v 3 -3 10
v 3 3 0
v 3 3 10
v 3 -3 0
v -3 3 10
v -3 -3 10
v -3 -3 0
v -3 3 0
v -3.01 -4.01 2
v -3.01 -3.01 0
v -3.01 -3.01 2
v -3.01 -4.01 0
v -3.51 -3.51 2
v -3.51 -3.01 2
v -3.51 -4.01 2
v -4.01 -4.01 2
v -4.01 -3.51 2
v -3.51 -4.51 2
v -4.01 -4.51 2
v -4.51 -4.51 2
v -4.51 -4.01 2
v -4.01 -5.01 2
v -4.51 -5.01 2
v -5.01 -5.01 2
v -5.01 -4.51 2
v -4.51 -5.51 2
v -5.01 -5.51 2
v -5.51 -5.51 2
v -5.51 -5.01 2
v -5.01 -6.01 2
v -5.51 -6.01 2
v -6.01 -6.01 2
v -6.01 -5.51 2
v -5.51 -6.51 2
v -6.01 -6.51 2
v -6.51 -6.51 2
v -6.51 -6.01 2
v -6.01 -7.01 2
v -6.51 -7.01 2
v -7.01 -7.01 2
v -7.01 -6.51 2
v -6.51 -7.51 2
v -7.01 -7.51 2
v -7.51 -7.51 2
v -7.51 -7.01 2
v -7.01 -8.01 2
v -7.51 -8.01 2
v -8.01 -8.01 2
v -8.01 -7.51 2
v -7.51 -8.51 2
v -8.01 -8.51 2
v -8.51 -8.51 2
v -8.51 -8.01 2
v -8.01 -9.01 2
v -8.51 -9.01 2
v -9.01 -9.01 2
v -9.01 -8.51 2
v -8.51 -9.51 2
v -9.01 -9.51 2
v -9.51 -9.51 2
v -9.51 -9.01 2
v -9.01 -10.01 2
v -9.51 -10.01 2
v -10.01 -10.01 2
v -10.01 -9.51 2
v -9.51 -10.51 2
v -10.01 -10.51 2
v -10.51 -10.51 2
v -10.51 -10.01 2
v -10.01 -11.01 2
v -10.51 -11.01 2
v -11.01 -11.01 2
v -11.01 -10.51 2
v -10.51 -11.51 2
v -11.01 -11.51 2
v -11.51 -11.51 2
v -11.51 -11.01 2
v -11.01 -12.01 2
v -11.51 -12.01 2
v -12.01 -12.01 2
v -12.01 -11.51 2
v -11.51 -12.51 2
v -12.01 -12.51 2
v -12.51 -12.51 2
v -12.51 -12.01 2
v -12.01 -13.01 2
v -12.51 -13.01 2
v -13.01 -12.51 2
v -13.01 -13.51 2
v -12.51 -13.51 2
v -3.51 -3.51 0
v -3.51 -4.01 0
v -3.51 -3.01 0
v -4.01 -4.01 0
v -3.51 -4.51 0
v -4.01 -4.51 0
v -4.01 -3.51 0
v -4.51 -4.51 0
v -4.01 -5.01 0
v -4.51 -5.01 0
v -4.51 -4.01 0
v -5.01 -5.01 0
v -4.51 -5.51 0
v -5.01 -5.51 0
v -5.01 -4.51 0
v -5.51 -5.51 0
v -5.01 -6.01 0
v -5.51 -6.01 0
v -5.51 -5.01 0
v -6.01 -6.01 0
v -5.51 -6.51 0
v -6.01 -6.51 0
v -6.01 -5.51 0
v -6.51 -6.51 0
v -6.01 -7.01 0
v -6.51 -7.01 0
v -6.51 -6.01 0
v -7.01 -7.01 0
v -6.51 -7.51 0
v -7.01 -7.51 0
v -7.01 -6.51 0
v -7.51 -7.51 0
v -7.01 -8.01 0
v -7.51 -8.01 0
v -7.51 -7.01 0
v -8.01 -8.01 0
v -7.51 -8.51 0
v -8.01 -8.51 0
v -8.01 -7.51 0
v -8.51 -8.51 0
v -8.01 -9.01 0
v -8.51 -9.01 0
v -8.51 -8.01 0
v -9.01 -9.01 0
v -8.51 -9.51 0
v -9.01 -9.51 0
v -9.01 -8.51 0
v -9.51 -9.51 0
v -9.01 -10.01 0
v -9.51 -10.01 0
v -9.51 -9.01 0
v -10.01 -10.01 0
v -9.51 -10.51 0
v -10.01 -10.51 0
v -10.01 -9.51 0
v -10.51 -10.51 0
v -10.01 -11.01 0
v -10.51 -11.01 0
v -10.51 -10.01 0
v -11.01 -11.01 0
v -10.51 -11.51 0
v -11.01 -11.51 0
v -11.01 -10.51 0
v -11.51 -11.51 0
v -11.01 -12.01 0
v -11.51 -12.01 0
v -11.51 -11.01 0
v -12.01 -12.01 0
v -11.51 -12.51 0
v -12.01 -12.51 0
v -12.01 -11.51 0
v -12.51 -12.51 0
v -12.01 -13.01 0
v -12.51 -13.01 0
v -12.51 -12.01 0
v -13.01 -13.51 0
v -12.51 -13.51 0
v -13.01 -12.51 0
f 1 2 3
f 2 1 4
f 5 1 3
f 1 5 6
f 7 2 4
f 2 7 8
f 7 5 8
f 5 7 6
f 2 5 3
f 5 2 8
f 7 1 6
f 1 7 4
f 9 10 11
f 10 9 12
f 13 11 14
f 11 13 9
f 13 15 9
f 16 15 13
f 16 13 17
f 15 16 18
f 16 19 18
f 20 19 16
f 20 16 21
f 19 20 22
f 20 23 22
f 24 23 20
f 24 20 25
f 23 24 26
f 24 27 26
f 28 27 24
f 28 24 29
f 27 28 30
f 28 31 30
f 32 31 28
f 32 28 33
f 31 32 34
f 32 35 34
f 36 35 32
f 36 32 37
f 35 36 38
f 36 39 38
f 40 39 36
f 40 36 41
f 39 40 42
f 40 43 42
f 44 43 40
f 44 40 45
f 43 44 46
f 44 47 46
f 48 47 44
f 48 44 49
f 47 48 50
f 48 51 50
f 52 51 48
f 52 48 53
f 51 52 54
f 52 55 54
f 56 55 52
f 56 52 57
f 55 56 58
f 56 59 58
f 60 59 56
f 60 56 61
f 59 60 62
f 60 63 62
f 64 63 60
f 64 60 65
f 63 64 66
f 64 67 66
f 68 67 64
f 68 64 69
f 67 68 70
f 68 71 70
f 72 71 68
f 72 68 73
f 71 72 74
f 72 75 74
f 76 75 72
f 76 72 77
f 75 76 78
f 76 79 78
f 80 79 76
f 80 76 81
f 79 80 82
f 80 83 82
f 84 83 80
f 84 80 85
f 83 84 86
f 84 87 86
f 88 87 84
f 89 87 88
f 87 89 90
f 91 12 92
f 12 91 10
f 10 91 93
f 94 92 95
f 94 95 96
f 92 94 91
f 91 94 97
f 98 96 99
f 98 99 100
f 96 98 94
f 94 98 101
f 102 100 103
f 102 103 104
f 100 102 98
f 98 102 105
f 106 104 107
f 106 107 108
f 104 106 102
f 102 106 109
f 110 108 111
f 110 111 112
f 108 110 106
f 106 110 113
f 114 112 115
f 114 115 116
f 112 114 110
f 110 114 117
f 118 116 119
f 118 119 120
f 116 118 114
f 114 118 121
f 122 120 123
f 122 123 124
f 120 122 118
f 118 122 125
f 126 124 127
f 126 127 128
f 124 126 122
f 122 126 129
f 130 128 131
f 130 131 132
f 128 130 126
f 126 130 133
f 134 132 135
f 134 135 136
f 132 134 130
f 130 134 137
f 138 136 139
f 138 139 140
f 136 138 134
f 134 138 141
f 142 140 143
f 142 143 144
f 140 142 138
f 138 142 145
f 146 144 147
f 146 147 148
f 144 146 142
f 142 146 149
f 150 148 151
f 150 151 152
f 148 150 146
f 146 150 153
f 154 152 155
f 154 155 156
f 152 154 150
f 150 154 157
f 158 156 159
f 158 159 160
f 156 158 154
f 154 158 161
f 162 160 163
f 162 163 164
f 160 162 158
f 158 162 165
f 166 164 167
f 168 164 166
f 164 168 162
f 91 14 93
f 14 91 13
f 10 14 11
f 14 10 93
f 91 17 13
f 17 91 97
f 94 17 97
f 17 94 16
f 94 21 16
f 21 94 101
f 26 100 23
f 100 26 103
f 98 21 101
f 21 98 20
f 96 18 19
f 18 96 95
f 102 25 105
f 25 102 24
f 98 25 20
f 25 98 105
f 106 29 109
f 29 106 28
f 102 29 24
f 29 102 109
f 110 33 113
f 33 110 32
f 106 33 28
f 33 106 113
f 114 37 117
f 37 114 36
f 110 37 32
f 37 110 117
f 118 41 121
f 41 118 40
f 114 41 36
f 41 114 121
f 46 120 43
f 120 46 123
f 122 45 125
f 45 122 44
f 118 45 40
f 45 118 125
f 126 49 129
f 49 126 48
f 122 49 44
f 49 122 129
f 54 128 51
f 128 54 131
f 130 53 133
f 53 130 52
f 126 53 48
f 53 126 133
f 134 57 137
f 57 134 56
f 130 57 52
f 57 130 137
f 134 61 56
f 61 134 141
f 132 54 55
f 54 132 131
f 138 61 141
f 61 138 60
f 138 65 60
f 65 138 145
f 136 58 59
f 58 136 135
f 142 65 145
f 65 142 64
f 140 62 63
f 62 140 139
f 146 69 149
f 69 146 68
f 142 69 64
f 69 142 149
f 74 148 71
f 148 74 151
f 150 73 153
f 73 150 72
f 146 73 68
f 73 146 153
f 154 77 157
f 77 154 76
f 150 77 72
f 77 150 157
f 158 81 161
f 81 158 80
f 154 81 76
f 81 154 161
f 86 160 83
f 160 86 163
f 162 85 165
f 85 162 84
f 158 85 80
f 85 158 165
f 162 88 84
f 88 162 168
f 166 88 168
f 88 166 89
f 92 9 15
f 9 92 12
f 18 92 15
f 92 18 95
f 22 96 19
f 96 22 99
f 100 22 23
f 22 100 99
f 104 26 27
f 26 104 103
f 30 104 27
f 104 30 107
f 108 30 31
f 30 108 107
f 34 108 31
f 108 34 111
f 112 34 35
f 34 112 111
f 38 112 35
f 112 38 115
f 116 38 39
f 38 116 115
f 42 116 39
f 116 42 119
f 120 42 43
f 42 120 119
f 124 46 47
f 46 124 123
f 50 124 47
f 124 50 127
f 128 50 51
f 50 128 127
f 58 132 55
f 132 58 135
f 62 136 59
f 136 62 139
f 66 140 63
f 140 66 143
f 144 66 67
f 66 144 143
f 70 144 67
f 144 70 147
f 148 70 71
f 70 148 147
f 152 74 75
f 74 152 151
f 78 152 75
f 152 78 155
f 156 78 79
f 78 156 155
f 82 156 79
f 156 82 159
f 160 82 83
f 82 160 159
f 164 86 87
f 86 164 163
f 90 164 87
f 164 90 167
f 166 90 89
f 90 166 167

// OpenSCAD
translate([0, 0, 5]) color([0,1,0,0.9]) cube([6, 6, 10], center=true);
translate([-3.26, -3.26, 1]) color([1,0,0]) cube([0.5, 0.5, 2], center=true);
translate([-3.76, -3.76, 1]) color([1,0,0]) cube([0.5, 0.5, 2], center=true);
translate([-4.26, -4.26, 1]) color([1,0,0]) cube([0.5, 0.5, 2], center=true);
translate([-4.76, -4.76, 1]) color([1,0,0]) cube([0.5, 0.5, 2], center=true);
translate([-5.26, -5.26, 1]) color([1,0,0]) cube([0.5, 0.5, 2], center=true);
translate([-5.76, -5.76, 1]) color([1,0,0]) cube([0.5, 0.5, 2], center=true);
translate([-6.26, -6.26, 1]) color([1,0,0]) cube([0.5, 0.5, 2], center=true);
translate([-6.76, -6.76, 1]) color([1,0,0]) cube([0.5, 0.5, 2], center=true);
translate([-7.26, -7.26, 1]) color([1,0,0]) cube([0.5, 0.5, 2], center=true);
translate([-7.76, -7.76, 1]) color([1,0,0]) cube([0.5, 0.5, 2], center=true);
translate([-8.26, -8.26, 1]) color([1,0,0]) cube([0.5, 0.5, 2], center=true);
translate([-8.76, -8.76, 1]) color([1,0,0]) cube([0.5, 0.5, 2], center=true);
translate([-9.26, -9.26, 1]) color([1,0,0]) cube([0.5, 0.5, 2], center=true);
translate([-9.76, -9.76, 1]) color([1,0,0]) cube([0.5, 0.5, 2], center=true);
translate([-10.26, -10.26, 1]) color([1,0,0]) cube([0.5, 0.5, 2], center=true);
translate([-10.76, -10.76, 1]) color([1,0,0]) cube([0.5, 0.5, 2], center=true);
translate([-11.26, -11.26, 1]) color([1,0,0]) cube([0.5, 0.5, 2], center=true);
translate([-11.76, -11.76, 1]) color([1,0,0]) cube([0.5, 0.5, 2], center=true);
translate([-12.26, -12.26, 1]) color([1,0,0]) cube([0.5, 0.5, 2], center=true);
translate([-12.76, -12.76, 1]) color([1,0,0]) cube([0.5, 0.5, 2], center=true);
translate([-3.26, -3.76, 1]) color([1,0,0]) cube([0.5, 0.5, 2], center=true);
translate([-3.76, -4.26, 1]) color([1,0,0]) cube([0.5, 0.5, 2], center=true);
translate([-4.26, -4.76, 1]) color([1,0,0]) cube([0.5, 0.5, 2], center=true);
translate([-4.76, -5.26, 1]) color([1,0,0]) cube([0.5, 0.5, 2], center=true);
translate([-5.26, -5.76, 1]) color([1,0,0]) cube([0.5, 0.5, 2], center=true);
translate([-5.76, -6.26, 1]) color([1,0,0]) cube([0.5, 0.5, 2], center=true);
translate([-6.26, -6.76, 1]) color([1,0,0]) cube([0.5, 0.5, 2], center=true);
translate([-6.76, -7.26, 1]) color([1,0,0]) cube([0.5, 0.5, 2], center=true);
translate([-7.26, -7.76, 1]) color([1,0,0]) cube([0.5, 0.5, 2], center=true);
translate([-7.76, -8.26, 1]) color([1,0,0]) cube([0.5, 0.5, 2], center=true);
translate([-8.26, -8.76, 1]) color([1,0,0]) cube([0.5, 0.5, 2], center=true);
translate([-8.76, -9.26, 1]) color([1,0,0]) cube([0.5, 0.5, 2], center=true);
translate([-9.26, -9.76, 1]) color([1,0,0]) cube([0.5, 0.5, 2], center=true);
translate([-9.76, -10.26, 1]) color([1,0,0]) cube([0.5, 0.5, 2], center=true);
translate([-10.26, -10.76, 1]) color([1,0,0]) cube([0.5, 0.5, 2], center=true);
translate([-10.76, -11.26, 1]) color([1,0,0]) cube([0.5, 0.5, 2], center=true);
translate([-11.26, -11.76, 1]) color([1,0,0]) cube([0.5, 0.5, 2], center=true);
translate([-11.76, -12.26, 1]) color([1,0,0]) cube([0.5, 0.5, 2], center=true);
translate([-12.26, -12.76, 1]) color([1,0,0]) cube([0.5, 0.5, 2], center=true);
translate([-12.76, -13.26, 1]) color([1,0,0]) cube([0.5, 0.5, 2], center=true);
